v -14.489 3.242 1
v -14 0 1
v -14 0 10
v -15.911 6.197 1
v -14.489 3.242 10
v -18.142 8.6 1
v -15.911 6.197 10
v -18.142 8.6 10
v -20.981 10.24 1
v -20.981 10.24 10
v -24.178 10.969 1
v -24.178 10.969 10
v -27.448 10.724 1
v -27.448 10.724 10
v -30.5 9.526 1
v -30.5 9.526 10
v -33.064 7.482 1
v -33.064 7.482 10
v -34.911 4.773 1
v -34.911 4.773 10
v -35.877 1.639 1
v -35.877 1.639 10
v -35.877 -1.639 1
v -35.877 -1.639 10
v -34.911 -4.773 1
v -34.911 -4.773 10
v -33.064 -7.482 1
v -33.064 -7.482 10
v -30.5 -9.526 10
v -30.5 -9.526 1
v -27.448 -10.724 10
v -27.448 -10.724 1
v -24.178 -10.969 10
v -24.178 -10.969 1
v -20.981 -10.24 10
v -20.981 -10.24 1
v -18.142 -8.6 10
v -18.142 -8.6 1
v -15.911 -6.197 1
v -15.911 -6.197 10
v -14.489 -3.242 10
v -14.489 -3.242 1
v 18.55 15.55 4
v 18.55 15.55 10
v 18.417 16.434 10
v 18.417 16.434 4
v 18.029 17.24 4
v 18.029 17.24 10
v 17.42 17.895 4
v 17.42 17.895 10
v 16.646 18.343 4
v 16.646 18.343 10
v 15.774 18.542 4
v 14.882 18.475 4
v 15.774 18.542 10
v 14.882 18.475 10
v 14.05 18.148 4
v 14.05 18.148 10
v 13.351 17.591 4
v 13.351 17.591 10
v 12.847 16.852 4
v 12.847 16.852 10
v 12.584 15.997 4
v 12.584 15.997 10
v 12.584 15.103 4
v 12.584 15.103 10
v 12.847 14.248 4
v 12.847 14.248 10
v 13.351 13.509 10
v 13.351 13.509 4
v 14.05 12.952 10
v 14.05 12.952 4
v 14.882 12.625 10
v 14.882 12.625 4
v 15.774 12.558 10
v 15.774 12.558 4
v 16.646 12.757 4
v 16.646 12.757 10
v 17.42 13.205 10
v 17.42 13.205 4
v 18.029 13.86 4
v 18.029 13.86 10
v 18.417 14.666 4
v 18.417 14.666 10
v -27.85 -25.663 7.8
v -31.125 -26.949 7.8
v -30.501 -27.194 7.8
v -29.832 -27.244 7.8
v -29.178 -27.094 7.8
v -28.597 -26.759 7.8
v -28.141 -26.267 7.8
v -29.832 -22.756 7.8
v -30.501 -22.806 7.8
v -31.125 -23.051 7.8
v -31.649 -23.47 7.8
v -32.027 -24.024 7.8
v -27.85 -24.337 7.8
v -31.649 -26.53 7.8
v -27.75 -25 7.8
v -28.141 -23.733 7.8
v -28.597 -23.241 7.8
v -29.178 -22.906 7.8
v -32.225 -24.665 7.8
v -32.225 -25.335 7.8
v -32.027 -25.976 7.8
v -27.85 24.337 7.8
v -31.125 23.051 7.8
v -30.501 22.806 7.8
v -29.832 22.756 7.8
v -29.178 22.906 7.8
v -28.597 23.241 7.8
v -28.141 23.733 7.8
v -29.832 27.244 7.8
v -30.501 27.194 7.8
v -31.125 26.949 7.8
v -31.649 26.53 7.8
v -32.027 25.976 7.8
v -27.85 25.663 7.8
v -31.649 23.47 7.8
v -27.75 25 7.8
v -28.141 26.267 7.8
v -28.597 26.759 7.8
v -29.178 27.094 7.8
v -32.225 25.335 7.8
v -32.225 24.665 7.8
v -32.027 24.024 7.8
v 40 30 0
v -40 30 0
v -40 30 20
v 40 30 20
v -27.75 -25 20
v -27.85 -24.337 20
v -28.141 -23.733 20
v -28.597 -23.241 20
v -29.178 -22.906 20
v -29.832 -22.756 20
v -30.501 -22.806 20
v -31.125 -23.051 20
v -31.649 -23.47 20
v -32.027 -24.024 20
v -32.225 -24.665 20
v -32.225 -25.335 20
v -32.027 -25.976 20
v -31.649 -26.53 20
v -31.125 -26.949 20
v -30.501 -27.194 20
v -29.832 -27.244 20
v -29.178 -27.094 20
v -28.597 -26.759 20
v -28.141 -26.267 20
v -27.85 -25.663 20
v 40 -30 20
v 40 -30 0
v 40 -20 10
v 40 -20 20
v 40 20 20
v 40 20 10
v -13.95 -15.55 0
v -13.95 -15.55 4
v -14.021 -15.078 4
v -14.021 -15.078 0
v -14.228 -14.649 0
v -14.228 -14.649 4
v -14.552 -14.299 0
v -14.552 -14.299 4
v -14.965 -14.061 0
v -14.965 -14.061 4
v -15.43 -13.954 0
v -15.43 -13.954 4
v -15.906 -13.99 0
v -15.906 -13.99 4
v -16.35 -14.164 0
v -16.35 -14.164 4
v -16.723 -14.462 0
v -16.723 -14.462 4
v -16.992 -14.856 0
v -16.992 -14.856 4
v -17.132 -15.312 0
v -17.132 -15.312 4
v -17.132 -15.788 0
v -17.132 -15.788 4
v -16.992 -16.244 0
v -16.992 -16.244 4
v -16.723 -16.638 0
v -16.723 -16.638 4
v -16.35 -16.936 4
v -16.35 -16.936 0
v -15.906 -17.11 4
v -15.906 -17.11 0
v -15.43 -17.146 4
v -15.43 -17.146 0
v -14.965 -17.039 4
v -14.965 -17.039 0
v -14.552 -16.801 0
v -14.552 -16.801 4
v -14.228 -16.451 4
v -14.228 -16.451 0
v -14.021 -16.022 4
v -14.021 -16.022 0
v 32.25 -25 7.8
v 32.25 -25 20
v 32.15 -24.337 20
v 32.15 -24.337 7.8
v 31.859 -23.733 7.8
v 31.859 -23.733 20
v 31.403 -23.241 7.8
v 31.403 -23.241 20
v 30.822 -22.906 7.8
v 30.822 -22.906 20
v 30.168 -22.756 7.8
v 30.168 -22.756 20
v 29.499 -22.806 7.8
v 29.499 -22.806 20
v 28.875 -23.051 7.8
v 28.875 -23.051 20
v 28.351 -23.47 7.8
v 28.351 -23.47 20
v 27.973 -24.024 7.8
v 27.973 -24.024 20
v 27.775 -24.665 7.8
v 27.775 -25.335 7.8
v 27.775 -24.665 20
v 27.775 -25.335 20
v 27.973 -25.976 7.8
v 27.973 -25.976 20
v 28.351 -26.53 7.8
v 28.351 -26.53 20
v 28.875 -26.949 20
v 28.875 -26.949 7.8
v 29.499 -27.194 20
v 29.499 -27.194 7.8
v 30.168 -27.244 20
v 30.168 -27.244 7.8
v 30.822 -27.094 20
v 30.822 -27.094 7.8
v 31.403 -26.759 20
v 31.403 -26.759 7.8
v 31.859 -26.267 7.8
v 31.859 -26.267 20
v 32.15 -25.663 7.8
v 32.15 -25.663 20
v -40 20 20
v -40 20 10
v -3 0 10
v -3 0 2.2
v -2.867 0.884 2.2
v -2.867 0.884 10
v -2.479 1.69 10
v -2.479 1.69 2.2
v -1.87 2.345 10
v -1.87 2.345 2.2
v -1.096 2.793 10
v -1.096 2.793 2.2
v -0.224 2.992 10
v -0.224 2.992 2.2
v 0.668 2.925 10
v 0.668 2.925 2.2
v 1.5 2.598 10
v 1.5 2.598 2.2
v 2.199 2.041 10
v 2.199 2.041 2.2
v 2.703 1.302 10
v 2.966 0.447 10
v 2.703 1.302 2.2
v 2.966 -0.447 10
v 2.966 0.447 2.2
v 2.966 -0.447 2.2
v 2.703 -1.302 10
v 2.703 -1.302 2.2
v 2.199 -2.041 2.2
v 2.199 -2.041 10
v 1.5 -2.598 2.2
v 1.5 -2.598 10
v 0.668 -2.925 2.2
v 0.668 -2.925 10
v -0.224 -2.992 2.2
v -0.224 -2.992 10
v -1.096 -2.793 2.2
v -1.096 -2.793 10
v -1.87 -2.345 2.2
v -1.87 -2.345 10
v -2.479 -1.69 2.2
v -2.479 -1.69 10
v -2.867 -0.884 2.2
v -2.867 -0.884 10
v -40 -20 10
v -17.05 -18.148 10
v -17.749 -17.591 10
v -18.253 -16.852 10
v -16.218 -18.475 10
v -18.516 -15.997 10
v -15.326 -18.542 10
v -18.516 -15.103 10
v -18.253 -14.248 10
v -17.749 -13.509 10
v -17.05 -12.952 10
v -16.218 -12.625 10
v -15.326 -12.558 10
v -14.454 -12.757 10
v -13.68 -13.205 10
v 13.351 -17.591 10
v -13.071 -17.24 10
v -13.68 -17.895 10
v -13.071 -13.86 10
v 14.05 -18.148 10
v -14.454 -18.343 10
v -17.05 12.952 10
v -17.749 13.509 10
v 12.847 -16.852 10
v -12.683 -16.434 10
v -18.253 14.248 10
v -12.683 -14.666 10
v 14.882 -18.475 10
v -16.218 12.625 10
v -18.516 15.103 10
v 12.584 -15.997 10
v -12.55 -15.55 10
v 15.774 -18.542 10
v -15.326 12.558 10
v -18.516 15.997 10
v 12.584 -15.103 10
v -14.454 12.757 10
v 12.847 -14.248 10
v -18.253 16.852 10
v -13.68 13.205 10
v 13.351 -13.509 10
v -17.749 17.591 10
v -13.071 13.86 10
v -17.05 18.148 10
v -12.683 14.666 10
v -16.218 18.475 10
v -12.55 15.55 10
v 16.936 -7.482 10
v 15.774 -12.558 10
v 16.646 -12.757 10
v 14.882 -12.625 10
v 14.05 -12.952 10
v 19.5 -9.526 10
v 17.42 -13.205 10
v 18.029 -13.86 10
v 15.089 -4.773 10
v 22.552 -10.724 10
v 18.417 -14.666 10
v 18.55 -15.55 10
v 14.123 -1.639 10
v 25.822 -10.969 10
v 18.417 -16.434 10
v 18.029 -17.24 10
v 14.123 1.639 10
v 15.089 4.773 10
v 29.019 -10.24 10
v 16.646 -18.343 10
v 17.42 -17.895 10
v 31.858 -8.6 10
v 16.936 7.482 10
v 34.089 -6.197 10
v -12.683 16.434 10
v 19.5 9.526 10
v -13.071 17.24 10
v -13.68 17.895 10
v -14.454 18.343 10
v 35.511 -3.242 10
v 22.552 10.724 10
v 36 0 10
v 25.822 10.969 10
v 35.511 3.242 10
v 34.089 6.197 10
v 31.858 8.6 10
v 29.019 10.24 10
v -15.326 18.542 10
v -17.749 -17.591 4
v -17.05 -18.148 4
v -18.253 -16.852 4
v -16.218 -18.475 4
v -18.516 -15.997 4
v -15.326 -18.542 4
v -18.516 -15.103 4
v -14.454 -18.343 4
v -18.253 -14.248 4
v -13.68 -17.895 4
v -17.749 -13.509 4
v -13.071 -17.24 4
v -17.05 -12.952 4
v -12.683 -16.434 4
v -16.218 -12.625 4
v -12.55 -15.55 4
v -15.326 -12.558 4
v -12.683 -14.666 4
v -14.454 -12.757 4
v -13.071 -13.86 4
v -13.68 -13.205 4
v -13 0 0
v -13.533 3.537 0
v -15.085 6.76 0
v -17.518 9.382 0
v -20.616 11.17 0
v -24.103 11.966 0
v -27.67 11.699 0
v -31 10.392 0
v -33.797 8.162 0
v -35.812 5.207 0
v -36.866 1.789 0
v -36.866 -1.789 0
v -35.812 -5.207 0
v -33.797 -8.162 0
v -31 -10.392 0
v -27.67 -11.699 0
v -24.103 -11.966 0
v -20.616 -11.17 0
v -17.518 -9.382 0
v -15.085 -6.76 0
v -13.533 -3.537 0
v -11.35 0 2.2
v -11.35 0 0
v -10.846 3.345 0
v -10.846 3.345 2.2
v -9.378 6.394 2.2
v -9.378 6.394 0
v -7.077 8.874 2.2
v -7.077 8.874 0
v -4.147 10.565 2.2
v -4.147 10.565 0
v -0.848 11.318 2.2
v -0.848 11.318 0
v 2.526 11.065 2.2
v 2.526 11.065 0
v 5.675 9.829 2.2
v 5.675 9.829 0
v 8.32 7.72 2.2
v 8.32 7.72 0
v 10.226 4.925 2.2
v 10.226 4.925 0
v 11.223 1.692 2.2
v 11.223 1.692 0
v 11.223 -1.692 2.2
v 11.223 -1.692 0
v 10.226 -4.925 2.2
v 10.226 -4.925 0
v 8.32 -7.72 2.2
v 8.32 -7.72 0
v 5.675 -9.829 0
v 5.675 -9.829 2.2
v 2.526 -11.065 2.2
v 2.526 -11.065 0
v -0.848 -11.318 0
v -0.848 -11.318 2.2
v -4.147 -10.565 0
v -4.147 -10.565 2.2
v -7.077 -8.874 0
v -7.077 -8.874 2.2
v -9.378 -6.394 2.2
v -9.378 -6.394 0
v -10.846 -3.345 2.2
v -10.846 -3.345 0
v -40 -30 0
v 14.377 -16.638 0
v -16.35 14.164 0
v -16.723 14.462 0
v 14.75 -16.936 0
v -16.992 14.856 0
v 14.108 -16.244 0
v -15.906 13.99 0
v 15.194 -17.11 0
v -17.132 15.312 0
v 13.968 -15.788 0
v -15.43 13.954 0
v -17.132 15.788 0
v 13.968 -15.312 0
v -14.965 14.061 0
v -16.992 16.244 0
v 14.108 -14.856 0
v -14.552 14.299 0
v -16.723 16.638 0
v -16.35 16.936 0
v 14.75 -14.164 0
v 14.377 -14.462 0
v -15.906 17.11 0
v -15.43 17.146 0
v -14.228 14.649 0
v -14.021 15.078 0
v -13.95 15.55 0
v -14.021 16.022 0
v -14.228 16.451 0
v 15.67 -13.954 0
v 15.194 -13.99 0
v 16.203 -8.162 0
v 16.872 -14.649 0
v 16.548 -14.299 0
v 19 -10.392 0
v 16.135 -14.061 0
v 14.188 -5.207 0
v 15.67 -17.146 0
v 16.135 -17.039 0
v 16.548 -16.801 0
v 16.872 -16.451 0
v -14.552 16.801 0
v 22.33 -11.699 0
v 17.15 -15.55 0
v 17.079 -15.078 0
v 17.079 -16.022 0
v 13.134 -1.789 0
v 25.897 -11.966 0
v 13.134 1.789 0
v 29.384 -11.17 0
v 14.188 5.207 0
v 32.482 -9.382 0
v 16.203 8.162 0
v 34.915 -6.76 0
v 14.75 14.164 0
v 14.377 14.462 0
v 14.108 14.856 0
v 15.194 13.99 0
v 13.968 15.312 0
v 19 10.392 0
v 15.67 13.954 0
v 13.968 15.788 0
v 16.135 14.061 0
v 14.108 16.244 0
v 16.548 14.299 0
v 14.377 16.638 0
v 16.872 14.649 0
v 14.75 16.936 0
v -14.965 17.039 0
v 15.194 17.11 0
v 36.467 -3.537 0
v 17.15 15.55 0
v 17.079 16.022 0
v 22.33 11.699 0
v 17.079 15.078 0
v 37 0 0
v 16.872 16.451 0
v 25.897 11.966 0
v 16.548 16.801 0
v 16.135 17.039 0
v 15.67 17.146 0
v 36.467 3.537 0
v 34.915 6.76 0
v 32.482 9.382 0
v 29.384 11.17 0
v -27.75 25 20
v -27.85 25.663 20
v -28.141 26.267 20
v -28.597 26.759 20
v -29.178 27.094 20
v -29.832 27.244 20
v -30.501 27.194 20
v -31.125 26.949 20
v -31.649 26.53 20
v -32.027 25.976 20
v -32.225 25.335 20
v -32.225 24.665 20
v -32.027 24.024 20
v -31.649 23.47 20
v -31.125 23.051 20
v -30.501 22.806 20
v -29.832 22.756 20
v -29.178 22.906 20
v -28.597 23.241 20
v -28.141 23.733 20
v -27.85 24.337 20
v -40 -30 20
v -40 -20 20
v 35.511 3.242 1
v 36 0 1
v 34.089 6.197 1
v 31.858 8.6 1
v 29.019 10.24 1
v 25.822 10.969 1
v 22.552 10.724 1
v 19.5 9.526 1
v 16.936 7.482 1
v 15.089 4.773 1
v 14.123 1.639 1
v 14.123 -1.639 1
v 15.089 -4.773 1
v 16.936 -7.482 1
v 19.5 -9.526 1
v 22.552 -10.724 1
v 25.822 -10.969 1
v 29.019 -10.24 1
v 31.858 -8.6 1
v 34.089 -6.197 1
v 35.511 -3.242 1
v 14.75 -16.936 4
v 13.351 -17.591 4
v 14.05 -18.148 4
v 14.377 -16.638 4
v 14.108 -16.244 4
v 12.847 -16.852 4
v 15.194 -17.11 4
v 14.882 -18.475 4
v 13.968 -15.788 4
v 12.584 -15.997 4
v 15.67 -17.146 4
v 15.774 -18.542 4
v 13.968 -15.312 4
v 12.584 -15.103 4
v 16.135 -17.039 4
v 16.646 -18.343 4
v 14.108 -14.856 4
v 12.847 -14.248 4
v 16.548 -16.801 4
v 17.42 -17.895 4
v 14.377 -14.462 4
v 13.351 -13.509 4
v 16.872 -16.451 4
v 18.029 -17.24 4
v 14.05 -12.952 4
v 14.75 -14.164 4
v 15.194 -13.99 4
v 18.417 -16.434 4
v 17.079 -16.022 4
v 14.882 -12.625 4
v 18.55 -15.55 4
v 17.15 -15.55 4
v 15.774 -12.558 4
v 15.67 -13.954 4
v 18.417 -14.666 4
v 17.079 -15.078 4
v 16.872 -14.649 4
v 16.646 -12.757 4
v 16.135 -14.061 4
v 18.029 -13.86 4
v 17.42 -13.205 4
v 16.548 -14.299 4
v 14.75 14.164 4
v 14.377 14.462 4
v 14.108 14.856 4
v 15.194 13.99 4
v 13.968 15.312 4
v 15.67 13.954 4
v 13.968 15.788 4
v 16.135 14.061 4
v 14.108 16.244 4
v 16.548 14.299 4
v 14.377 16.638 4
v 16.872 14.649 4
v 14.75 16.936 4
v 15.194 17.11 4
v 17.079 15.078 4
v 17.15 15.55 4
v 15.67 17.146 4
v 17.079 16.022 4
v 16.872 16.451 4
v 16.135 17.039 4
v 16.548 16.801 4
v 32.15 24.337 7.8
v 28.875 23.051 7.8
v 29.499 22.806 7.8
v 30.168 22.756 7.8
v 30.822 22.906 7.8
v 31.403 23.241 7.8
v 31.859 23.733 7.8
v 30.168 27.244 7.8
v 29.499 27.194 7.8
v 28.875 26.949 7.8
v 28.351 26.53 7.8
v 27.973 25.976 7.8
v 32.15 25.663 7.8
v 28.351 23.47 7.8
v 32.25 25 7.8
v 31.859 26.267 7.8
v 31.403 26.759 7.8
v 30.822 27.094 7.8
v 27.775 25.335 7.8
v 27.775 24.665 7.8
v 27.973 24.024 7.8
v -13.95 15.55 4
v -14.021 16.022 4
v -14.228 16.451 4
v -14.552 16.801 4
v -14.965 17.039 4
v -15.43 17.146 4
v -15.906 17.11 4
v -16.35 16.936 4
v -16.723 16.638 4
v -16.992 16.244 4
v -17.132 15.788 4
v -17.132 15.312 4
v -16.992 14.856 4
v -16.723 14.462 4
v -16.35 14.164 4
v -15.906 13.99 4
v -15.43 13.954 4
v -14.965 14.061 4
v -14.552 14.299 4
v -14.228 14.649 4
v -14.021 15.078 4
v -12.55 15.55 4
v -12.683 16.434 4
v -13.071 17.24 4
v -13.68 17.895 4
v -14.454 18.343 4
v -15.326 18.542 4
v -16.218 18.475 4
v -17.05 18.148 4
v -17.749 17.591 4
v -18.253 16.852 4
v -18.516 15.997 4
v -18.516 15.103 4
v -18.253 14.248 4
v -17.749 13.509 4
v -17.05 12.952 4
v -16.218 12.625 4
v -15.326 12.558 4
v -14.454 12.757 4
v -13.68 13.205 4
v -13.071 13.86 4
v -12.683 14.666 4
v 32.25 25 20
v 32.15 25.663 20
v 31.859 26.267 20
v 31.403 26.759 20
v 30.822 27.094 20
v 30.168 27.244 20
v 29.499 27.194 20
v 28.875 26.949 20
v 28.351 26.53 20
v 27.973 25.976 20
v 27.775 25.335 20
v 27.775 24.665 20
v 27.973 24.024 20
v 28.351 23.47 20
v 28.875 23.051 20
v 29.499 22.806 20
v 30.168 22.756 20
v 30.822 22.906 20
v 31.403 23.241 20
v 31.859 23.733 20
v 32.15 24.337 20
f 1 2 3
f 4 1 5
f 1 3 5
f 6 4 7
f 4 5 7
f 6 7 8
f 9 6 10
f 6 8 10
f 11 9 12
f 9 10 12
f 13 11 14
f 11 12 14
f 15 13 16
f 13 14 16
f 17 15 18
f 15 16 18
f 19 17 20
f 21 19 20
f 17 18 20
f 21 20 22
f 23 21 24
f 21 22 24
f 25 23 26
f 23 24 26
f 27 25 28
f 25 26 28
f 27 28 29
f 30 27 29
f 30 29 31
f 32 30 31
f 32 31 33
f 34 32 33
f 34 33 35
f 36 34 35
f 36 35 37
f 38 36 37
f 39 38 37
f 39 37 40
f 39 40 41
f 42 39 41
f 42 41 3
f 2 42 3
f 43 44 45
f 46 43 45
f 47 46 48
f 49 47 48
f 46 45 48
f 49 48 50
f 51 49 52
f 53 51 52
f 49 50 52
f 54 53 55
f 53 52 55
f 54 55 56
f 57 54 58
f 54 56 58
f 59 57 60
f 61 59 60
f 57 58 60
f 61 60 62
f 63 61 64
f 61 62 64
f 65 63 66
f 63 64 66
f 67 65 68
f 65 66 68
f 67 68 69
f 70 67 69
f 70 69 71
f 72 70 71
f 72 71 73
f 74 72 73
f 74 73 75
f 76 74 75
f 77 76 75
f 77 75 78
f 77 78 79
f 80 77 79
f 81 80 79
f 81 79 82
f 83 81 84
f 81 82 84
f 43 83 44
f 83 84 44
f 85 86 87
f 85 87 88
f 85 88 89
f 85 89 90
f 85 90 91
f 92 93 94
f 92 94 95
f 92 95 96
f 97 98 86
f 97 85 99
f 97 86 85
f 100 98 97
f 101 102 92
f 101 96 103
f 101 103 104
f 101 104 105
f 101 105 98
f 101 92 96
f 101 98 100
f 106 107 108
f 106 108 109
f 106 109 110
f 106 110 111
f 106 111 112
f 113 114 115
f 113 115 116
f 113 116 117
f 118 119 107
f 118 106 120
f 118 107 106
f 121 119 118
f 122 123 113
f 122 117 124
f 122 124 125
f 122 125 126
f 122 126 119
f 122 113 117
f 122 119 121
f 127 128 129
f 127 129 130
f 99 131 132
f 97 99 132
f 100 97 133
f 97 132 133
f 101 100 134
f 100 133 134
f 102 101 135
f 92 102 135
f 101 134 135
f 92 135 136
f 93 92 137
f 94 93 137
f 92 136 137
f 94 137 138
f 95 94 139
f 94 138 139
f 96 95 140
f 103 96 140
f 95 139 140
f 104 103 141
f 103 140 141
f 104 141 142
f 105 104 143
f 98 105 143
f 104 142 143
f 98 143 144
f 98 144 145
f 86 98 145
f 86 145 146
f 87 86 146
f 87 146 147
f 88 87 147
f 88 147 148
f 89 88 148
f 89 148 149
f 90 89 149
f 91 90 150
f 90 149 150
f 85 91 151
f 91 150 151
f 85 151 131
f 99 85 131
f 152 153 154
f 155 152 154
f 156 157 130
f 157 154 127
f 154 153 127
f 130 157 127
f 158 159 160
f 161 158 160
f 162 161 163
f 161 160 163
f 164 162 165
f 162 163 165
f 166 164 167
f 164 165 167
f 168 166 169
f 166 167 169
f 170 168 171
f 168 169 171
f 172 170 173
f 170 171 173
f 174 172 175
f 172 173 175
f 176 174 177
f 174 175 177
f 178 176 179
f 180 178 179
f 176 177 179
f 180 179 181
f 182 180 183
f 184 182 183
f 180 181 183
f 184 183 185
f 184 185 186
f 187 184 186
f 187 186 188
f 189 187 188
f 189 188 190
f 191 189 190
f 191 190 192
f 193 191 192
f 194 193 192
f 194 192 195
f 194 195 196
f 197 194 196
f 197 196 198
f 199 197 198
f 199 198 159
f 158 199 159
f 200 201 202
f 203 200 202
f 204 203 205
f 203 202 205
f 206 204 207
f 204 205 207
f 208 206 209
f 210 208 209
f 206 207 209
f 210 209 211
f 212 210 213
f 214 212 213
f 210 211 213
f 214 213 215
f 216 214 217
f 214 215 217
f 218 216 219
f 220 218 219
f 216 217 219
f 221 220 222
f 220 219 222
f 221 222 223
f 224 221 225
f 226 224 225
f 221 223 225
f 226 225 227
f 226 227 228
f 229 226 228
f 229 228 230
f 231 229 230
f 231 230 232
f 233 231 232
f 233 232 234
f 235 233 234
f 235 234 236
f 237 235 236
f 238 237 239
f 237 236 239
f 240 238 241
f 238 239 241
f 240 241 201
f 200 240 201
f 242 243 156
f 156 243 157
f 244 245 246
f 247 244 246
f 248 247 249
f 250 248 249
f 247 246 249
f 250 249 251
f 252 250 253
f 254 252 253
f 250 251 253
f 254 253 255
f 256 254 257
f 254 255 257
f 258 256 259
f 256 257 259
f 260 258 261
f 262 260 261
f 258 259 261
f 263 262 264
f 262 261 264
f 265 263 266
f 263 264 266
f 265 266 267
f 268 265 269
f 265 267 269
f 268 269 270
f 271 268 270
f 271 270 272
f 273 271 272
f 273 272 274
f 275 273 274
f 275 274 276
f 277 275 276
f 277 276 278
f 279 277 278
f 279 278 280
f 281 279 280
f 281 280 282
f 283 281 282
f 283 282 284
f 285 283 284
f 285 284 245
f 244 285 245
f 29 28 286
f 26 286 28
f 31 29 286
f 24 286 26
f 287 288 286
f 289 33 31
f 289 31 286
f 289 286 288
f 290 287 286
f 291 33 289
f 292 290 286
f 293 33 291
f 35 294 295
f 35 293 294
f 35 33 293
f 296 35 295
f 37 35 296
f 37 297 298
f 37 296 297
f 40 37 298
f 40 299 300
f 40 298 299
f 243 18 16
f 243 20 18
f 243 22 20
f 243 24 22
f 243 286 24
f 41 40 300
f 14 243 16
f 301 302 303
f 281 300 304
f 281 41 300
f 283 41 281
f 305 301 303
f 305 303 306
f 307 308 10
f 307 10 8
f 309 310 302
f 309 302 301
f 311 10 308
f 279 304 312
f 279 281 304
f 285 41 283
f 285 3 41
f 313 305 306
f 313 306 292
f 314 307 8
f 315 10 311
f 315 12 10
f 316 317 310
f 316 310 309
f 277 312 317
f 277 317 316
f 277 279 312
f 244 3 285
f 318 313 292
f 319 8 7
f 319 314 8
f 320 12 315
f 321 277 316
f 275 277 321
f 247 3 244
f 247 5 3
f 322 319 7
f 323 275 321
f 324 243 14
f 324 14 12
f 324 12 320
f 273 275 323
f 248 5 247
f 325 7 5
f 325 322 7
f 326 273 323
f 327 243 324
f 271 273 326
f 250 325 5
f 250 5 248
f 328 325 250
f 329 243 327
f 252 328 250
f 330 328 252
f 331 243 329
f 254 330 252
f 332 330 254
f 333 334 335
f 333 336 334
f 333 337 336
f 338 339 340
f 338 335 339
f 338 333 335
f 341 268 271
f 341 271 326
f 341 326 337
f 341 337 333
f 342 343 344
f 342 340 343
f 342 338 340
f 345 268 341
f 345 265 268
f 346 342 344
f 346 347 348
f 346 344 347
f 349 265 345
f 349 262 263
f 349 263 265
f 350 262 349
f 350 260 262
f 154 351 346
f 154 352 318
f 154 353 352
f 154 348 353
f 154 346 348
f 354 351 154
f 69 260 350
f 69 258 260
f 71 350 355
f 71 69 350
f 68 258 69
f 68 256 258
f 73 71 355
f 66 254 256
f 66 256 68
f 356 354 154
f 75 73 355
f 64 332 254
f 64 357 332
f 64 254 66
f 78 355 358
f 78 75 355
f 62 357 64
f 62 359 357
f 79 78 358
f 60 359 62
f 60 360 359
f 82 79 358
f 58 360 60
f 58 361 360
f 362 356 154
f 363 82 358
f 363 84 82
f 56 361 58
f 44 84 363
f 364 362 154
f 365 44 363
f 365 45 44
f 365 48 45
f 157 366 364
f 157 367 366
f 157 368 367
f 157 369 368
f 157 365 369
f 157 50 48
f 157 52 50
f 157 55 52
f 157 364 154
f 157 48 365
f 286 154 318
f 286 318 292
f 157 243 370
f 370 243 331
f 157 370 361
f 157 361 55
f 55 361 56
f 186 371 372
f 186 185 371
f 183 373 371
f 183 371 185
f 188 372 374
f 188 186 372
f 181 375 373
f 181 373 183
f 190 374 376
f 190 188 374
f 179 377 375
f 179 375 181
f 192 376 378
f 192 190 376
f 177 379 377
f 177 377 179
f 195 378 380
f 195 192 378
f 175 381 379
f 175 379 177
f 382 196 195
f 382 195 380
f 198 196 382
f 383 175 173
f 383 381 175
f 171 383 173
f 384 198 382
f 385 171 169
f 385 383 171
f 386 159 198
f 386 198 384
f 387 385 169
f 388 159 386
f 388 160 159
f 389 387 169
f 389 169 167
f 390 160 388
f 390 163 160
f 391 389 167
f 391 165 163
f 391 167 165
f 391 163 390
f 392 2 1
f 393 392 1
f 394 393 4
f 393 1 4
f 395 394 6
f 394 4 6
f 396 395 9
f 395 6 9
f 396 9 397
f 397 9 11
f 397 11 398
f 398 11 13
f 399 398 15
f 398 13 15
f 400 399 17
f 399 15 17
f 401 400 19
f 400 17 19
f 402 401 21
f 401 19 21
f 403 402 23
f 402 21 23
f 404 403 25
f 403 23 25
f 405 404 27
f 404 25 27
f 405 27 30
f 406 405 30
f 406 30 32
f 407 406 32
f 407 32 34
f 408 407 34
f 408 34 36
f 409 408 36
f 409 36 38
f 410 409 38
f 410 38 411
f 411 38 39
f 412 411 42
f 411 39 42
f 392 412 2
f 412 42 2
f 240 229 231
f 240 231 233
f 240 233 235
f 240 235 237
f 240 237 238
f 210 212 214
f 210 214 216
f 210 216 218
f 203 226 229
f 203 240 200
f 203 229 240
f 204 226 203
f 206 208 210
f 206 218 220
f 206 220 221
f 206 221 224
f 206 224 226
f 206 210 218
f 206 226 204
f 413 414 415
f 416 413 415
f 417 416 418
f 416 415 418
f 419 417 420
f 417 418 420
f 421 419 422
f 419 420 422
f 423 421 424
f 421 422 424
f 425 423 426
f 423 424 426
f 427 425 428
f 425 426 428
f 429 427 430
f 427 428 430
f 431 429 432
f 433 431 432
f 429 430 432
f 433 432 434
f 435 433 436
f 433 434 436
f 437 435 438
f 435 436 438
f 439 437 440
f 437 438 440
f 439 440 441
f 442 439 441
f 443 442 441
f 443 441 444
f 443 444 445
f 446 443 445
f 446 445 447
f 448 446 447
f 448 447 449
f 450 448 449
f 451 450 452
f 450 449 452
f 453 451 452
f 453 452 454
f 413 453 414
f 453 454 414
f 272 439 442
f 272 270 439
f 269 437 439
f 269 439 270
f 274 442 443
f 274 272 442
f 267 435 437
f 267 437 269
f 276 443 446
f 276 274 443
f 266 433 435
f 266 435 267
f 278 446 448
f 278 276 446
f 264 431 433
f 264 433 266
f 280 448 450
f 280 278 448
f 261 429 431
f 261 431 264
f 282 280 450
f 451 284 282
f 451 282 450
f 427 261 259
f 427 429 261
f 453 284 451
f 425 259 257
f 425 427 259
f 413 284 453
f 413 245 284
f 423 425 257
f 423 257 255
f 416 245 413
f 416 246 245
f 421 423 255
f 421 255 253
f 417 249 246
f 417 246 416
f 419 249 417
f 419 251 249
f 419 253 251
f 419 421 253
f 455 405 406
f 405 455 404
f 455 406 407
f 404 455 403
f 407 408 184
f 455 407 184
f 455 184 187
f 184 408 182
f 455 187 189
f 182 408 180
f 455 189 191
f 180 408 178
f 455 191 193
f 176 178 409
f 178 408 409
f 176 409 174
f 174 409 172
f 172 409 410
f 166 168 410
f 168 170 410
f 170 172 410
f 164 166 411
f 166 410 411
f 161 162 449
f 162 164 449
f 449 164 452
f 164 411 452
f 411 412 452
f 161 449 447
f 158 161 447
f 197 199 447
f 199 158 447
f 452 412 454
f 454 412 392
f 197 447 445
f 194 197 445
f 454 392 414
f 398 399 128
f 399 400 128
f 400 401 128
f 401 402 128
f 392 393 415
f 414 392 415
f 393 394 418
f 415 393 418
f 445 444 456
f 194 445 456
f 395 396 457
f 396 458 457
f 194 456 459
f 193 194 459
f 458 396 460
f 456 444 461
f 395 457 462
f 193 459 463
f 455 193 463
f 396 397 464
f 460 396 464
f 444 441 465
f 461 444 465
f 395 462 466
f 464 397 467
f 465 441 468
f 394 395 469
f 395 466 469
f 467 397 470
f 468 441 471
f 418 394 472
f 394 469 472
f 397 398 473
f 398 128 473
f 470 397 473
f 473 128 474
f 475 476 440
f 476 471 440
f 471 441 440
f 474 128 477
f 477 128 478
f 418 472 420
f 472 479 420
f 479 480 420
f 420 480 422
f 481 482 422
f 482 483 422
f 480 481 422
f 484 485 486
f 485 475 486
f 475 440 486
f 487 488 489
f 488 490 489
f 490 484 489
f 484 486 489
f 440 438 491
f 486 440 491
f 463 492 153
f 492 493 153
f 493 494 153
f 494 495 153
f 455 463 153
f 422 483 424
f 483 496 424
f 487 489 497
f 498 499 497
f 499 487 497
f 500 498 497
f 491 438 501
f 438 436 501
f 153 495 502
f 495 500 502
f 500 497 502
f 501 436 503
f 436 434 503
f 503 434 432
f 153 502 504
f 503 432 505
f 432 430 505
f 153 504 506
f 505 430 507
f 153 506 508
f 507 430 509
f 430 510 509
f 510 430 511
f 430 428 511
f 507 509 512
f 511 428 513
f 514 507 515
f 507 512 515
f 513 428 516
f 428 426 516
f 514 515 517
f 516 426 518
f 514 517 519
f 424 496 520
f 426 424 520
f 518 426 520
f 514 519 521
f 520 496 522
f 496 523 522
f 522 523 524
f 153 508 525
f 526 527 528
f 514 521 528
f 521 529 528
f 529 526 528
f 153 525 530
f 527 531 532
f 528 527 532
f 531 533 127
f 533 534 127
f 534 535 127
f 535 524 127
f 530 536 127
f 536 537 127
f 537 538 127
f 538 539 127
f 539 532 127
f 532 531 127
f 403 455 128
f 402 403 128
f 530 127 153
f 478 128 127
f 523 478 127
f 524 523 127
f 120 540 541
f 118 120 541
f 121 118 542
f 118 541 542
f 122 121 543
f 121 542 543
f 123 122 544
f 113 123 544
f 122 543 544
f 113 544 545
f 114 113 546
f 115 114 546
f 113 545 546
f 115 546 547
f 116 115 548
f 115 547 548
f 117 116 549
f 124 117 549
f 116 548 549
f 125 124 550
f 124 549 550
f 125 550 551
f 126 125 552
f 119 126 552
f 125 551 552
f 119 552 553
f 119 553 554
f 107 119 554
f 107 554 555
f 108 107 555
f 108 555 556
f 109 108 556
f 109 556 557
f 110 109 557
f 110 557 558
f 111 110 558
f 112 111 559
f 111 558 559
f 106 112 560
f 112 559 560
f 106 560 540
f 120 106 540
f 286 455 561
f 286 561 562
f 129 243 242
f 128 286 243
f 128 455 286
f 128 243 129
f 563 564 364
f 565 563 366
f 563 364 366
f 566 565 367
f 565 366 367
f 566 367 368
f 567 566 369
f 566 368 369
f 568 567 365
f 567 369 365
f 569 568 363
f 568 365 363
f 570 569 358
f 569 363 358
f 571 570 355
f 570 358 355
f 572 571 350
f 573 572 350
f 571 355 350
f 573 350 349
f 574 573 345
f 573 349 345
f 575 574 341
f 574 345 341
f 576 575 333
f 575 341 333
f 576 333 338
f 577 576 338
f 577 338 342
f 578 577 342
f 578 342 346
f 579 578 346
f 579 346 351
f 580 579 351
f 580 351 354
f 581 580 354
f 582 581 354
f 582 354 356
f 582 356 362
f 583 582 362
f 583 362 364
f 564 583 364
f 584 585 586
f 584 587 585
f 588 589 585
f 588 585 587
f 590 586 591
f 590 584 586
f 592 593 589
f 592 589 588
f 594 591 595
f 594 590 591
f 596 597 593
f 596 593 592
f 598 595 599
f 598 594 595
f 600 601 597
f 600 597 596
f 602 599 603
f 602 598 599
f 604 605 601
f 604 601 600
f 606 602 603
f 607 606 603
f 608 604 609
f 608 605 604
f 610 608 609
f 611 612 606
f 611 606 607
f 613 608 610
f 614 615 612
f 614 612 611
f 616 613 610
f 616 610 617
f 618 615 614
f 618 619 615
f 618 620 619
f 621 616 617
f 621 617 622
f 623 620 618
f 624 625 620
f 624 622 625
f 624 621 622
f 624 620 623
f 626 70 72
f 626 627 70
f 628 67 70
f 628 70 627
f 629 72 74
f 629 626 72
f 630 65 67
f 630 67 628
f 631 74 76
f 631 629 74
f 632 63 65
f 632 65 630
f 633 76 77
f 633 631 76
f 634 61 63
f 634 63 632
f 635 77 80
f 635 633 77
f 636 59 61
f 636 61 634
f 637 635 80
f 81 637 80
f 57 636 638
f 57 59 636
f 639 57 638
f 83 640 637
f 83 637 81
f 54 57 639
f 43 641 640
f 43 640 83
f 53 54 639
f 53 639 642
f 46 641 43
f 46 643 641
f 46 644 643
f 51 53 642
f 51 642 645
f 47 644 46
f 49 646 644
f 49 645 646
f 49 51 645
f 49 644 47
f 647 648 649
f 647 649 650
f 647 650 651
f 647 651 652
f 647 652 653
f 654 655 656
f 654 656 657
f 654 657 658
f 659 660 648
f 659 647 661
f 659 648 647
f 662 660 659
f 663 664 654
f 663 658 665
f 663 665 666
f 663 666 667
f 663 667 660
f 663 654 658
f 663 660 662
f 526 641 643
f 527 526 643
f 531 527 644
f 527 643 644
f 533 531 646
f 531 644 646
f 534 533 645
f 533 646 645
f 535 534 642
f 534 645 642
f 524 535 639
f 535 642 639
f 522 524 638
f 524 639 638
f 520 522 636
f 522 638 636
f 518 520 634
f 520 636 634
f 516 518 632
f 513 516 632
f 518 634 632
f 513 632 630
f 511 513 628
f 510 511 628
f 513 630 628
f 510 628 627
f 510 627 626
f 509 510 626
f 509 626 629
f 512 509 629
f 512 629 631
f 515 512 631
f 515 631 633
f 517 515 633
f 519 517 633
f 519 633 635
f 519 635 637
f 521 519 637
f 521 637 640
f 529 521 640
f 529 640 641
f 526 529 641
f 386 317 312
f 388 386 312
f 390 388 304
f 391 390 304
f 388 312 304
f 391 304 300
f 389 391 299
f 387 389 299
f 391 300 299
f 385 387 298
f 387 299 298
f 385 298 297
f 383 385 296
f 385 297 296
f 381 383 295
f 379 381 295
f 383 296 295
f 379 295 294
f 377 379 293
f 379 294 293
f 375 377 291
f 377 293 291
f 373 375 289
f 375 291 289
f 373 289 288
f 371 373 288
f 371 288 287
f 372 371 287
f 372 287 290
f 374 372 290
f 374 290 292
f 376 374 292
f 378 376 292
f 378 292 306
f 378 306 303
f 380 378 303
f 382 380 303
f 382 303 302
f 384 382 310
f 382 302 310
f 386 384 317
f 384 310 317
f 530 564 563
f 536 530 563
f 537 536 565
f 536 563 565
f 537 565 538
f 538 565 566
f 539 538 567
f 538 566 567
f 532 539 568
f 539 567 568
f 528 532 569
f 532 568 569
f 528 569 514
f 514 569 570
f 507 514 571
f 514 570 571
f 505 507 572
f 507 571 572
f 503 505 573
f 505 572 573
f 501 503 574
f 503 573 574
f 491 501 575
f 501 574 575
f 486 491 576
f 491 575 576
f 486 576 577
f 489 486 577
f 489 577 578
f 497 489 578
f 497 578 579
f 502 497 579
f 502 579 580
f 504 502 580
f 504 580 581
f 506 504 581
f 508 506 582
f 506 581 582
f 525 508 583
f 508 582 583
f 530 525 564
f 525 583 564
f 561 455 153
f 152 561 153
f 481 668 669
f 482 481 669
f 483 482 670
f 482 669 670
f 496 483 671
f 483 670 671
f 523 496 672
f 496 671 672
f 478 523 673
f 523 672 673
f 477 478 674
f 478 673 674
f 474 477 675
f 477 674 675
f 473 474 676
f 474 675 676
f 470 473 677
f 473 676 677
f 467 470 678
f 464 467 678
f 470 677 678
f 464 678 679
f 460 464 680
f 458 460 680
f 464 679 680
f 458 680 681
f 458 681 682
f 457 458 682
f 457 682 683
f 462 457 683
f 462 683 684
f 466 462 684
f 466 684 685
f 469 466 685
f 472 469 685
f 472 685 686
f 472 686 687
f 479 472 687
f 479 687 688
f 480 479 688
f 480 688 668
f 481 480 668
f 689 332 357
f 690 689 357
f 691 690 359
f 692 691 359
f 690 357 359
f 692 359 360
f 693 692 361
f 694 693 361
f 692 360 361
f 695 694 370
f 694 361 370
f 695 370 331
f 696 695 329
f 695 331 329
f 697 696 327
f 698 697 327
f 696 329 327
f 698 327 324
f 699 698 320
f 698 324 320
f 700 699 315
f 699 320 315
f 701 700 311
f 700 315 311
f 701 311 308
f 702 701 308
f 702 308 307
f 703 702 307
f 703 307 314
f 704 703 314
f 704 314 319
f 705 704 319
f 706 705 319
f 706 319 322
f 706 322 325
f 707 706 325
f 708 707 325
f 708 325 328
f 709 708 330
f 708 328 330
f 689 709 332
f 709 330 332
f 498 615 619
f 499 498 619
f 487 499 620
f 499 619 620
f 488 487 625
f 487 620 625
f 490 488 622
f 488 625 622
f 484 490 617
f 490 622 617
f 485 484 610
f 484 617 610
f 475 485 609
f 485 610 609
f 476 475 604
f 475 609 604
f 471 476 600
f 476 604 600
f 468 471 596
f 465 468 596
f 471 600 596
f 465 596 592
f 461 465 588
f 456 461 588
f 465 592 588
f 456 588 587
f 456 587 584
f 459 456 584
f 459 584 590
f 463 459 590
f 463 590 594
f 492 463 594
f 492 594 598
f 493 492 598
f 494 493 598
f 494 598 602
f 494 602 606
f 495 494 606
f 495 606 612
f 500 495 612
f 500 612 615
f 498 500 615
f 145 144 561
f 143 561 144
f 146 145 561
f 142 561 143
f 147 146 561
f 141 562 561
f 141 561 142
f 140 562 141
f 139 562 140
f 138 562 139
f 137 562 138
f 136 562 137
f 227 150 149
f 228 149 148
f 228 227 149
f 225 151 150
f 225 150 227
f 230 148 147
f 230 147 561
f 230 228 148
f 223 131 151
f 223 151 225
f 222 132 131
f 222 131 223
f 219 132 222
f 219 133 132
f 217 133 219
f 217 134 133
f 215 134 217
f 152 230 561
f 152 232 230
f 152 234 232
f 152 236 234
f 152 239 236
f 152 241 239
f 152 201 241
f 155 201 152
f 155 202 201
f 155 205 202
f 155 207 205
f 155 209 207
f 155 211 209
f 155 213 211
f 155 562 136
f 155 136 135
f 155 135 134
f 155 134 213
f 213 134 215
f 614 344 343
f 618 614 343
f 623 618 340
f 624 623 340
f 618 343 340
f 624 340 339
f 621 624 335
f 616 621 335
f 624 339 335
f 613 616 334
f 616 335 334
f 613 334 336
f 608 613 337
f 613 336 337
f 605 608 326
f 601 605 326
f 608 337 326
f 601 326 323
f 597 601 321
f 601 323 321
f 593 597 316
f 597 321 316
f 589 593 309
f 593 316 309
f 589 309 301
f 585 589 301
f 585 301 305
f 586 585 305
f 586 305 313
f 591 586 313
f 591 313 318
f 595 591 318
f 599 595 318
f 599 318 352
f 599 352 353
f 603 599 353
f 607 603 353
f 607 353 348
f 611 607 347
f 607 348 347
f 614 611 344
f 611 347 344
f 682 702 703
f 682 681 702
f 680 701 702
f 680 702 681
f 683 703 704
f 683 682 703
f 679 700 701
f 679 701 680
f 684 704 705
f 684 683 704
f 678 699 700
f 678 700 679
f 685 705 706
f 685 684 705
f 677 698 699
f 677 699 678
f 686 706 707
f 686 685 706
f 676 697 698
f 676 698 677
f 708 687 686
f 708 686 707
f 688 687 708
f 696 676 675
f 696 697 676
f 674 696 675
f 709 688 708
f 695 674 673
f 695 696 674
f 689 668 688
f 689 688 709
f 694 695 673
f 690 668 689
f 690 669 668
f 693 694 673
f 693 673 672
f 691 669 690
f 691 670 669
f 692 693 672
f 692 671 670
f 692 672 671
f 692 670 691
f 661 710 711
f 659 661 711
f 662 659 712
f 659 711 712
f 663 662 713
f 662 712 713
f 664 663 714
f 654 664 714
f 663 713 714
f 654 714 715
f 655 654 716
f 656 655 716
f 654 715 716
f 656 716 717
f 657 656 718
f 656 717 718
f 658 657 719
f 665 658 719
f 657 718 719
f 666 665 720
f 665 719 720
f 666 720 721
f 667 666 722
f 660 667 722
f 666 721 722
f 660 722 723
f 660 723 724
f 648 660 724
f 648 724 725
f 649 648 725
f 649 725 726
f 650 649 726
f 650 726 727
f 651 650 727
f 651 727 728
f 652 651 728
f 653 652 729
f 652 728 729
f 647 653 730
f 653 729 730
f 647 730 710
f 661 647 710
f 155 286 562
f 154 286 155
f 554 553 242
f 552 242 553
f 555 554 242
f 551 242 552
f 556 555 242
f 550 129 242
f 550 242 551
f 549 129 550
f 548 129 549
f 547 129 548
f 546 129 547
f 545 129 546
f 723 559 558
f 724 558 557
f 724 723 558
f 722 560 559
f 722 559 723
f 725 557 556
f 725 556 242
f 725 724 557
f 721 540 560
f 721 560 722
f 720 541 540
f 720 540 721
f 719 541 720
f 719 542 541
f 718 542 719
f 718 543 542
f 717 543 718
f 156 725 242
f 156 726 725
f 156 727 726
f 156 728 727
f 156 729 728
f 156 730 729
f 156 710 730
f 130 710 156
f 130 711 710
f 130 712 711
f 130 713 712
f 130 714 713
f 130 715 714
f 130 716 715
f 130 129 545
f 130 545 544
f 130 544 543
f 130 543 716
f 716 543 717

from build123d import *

# Parameters (mm, degrees)
SKIZZE1_W                       = 80
SKIZZE1_H                       = 60
AUFSATZ_LINEAR_AUSTRAGEN1_DEPTH = 10
SKIZZE2_W                       = 80
SKIZZE2_H                       = 10
AUFSATZ_LINEAR_AUSTRAGEN2_DEPTH = 10
SKIZZE3_R                       = 11.35
SCHNITT_LINEAR_AUSTRAGEN1_DEPTH = 2.2
SKIZZE4_R                       = 3
SCHNITT_LINEAR_AUSTRAGEN2_DEPTH = 12.2
SKIZZE5_R                       = 2.25
SCHNITT_LINEAR_AUSTRAGEN3_DEPTH = 12.2
SKIZZE6_R                       = 11
SCHNITT_LINEAR_AUSTRAGEN4_DEPTH = 12.2
SKIZZE7_R                       = 1.6
SCHNITT_LINEAR_AUSTRAGEN5_DEPTH = 12.2
SKIZZE8_R                       = 3
SCHNITT_LINEAR_AUSTRAGEN6_DEPTH = 6
FASE1_SIZE                      = 1


with BuildPart() as part:
    # Skizze1 → Aufsatz-Linear austragen1 (new body)
    with BuildSketch(Plane.XY):
        Rectangle(SKIZZE1_W, SKIZZE1_H)
    extrude(amount=AUFSATZ_LINEAR_AUSTRAGEN1_DEPTH)

    # Skizze2 → Aufsatz-Linear austragen2 (add)
    with BuildSketch(Plane.XY.offset(10)):
        with Locations((0, 25)):
            Rectangle(SKIZZE2_W, SKIZZE2_H)
        with Locations((0, -25)):
            Rectangle(SKIZZE2_W, SKIZZE2_H)
    extrude(amount=AUFSATZ_LINEAR_AUSTRAGEN2_DEPTH)

    # Skizze3 → Schnitt-Linear austragen1 (cut)
    with BuildSketch(Plane(origin=(0, 0, 0), x_dir=(-1, 0, 0), z_dir=(0, 0, -1))):
        Circle(SKIZZE3_R)
    extrude(amount=-SCHNITT_LINEAR_AUSTRAGEN1_DEPTH, mode=Mode.SUBTRACT)

    # Skizze4 → Schnitt-Linear austragen2 (cut)
    with BuildSketch(Plane(origin=(0, 0, 2.2), x_dir=(-1, 0, 0), z_dir=(0, 0, -1))):
        Circle(SKIZZE4_R)
    extrude(amount=-SCHNITT_LINEAR_AUSTRAGEN2_DEPTH, mode=Mode.SUBTRACT)

    # Skizze5 → Schnitt-Linear austragen3 (cut)
    with BuildSketch(Plane.XY.offset(20)):
        with Locations((30, 25)):
            Circle(SKIZZE5_R)
        with Locations((-30, 25)):
            Circle(SKIZZE5_R)
        with Locations((-30, -25)):
            Circle(SKIZZE5_R)
        with Locations((30, -25)):
            Circle(SKIZZE5_R)
    extrude(amount=-SCHNITT_LINEAR_AUSTRAGEN3_DEPTH, mode=Mode.SUBTRACT)

    # Skizze6 → Schnitt-Linear austragen4 (cut)
    with BuildSketch(Plane.XY.offset(10)):
        with Locations((-25, 0)):
            Circle(SKIZZE6_R)
        with Locations((25, 0)):
            Circle(SKIZZE6_R)
    extrude(amount=-SCHNITT_LINEAR_AUSTRAGEN4_DEPTH, mode=Mode.SUBTRACT)

    # Skizze7 → Schnitt-Linear austragen5 (cut)
    with BuildSketch(Plane.XY.offset(10)):
        with Locations((-15.55, 15.55)):
            Circle(SKIZZE7_R)
        with Locations((15.55, 15.55)):
            Circle(SKIZZE7_R)
        with Locations((15.55, -15.55)):
            Circle(SKIZZE7_R)
        with Locations((-15.55, -15.55)):
            Circle(SKIZZE7_R)
    extrude(amount=-SCHNITT_LINEAR_AUSTRAGEN5_DEPTH, mode=Mode.SUBTRACT)

    # Skizze8 → Schnitt-Linear austragen6 (cut)
    with BuildSketch(Plane.XY.offset(10)):
        with Locations((-15.55, 15.55)):
            Circle(SKIZZE8_R)
        with Locations((15.55, 15.55)):
            Circle(SKIZZE8_R)
        with Locations((-15.55, -15.55)):
            Circle(SKIZZE8_R)
        with Locations((15.55, -15.55)):
            Circle(SKIZZE8_R)
    extrude(amount=-SCHNITT_LINEAR_AUSTRAGEN6_DEPTH, mode=Mode.SUBTRACT)

    # Fase1
    fase1_edges = [part.edges().sort_by_distance(p)[0] for p in [
        (-36, 0, 0),
        (14, 0, 0),
    ]]
    chamfer(fase1_edges, length=FASE1_SIZE)


solid = part.part
